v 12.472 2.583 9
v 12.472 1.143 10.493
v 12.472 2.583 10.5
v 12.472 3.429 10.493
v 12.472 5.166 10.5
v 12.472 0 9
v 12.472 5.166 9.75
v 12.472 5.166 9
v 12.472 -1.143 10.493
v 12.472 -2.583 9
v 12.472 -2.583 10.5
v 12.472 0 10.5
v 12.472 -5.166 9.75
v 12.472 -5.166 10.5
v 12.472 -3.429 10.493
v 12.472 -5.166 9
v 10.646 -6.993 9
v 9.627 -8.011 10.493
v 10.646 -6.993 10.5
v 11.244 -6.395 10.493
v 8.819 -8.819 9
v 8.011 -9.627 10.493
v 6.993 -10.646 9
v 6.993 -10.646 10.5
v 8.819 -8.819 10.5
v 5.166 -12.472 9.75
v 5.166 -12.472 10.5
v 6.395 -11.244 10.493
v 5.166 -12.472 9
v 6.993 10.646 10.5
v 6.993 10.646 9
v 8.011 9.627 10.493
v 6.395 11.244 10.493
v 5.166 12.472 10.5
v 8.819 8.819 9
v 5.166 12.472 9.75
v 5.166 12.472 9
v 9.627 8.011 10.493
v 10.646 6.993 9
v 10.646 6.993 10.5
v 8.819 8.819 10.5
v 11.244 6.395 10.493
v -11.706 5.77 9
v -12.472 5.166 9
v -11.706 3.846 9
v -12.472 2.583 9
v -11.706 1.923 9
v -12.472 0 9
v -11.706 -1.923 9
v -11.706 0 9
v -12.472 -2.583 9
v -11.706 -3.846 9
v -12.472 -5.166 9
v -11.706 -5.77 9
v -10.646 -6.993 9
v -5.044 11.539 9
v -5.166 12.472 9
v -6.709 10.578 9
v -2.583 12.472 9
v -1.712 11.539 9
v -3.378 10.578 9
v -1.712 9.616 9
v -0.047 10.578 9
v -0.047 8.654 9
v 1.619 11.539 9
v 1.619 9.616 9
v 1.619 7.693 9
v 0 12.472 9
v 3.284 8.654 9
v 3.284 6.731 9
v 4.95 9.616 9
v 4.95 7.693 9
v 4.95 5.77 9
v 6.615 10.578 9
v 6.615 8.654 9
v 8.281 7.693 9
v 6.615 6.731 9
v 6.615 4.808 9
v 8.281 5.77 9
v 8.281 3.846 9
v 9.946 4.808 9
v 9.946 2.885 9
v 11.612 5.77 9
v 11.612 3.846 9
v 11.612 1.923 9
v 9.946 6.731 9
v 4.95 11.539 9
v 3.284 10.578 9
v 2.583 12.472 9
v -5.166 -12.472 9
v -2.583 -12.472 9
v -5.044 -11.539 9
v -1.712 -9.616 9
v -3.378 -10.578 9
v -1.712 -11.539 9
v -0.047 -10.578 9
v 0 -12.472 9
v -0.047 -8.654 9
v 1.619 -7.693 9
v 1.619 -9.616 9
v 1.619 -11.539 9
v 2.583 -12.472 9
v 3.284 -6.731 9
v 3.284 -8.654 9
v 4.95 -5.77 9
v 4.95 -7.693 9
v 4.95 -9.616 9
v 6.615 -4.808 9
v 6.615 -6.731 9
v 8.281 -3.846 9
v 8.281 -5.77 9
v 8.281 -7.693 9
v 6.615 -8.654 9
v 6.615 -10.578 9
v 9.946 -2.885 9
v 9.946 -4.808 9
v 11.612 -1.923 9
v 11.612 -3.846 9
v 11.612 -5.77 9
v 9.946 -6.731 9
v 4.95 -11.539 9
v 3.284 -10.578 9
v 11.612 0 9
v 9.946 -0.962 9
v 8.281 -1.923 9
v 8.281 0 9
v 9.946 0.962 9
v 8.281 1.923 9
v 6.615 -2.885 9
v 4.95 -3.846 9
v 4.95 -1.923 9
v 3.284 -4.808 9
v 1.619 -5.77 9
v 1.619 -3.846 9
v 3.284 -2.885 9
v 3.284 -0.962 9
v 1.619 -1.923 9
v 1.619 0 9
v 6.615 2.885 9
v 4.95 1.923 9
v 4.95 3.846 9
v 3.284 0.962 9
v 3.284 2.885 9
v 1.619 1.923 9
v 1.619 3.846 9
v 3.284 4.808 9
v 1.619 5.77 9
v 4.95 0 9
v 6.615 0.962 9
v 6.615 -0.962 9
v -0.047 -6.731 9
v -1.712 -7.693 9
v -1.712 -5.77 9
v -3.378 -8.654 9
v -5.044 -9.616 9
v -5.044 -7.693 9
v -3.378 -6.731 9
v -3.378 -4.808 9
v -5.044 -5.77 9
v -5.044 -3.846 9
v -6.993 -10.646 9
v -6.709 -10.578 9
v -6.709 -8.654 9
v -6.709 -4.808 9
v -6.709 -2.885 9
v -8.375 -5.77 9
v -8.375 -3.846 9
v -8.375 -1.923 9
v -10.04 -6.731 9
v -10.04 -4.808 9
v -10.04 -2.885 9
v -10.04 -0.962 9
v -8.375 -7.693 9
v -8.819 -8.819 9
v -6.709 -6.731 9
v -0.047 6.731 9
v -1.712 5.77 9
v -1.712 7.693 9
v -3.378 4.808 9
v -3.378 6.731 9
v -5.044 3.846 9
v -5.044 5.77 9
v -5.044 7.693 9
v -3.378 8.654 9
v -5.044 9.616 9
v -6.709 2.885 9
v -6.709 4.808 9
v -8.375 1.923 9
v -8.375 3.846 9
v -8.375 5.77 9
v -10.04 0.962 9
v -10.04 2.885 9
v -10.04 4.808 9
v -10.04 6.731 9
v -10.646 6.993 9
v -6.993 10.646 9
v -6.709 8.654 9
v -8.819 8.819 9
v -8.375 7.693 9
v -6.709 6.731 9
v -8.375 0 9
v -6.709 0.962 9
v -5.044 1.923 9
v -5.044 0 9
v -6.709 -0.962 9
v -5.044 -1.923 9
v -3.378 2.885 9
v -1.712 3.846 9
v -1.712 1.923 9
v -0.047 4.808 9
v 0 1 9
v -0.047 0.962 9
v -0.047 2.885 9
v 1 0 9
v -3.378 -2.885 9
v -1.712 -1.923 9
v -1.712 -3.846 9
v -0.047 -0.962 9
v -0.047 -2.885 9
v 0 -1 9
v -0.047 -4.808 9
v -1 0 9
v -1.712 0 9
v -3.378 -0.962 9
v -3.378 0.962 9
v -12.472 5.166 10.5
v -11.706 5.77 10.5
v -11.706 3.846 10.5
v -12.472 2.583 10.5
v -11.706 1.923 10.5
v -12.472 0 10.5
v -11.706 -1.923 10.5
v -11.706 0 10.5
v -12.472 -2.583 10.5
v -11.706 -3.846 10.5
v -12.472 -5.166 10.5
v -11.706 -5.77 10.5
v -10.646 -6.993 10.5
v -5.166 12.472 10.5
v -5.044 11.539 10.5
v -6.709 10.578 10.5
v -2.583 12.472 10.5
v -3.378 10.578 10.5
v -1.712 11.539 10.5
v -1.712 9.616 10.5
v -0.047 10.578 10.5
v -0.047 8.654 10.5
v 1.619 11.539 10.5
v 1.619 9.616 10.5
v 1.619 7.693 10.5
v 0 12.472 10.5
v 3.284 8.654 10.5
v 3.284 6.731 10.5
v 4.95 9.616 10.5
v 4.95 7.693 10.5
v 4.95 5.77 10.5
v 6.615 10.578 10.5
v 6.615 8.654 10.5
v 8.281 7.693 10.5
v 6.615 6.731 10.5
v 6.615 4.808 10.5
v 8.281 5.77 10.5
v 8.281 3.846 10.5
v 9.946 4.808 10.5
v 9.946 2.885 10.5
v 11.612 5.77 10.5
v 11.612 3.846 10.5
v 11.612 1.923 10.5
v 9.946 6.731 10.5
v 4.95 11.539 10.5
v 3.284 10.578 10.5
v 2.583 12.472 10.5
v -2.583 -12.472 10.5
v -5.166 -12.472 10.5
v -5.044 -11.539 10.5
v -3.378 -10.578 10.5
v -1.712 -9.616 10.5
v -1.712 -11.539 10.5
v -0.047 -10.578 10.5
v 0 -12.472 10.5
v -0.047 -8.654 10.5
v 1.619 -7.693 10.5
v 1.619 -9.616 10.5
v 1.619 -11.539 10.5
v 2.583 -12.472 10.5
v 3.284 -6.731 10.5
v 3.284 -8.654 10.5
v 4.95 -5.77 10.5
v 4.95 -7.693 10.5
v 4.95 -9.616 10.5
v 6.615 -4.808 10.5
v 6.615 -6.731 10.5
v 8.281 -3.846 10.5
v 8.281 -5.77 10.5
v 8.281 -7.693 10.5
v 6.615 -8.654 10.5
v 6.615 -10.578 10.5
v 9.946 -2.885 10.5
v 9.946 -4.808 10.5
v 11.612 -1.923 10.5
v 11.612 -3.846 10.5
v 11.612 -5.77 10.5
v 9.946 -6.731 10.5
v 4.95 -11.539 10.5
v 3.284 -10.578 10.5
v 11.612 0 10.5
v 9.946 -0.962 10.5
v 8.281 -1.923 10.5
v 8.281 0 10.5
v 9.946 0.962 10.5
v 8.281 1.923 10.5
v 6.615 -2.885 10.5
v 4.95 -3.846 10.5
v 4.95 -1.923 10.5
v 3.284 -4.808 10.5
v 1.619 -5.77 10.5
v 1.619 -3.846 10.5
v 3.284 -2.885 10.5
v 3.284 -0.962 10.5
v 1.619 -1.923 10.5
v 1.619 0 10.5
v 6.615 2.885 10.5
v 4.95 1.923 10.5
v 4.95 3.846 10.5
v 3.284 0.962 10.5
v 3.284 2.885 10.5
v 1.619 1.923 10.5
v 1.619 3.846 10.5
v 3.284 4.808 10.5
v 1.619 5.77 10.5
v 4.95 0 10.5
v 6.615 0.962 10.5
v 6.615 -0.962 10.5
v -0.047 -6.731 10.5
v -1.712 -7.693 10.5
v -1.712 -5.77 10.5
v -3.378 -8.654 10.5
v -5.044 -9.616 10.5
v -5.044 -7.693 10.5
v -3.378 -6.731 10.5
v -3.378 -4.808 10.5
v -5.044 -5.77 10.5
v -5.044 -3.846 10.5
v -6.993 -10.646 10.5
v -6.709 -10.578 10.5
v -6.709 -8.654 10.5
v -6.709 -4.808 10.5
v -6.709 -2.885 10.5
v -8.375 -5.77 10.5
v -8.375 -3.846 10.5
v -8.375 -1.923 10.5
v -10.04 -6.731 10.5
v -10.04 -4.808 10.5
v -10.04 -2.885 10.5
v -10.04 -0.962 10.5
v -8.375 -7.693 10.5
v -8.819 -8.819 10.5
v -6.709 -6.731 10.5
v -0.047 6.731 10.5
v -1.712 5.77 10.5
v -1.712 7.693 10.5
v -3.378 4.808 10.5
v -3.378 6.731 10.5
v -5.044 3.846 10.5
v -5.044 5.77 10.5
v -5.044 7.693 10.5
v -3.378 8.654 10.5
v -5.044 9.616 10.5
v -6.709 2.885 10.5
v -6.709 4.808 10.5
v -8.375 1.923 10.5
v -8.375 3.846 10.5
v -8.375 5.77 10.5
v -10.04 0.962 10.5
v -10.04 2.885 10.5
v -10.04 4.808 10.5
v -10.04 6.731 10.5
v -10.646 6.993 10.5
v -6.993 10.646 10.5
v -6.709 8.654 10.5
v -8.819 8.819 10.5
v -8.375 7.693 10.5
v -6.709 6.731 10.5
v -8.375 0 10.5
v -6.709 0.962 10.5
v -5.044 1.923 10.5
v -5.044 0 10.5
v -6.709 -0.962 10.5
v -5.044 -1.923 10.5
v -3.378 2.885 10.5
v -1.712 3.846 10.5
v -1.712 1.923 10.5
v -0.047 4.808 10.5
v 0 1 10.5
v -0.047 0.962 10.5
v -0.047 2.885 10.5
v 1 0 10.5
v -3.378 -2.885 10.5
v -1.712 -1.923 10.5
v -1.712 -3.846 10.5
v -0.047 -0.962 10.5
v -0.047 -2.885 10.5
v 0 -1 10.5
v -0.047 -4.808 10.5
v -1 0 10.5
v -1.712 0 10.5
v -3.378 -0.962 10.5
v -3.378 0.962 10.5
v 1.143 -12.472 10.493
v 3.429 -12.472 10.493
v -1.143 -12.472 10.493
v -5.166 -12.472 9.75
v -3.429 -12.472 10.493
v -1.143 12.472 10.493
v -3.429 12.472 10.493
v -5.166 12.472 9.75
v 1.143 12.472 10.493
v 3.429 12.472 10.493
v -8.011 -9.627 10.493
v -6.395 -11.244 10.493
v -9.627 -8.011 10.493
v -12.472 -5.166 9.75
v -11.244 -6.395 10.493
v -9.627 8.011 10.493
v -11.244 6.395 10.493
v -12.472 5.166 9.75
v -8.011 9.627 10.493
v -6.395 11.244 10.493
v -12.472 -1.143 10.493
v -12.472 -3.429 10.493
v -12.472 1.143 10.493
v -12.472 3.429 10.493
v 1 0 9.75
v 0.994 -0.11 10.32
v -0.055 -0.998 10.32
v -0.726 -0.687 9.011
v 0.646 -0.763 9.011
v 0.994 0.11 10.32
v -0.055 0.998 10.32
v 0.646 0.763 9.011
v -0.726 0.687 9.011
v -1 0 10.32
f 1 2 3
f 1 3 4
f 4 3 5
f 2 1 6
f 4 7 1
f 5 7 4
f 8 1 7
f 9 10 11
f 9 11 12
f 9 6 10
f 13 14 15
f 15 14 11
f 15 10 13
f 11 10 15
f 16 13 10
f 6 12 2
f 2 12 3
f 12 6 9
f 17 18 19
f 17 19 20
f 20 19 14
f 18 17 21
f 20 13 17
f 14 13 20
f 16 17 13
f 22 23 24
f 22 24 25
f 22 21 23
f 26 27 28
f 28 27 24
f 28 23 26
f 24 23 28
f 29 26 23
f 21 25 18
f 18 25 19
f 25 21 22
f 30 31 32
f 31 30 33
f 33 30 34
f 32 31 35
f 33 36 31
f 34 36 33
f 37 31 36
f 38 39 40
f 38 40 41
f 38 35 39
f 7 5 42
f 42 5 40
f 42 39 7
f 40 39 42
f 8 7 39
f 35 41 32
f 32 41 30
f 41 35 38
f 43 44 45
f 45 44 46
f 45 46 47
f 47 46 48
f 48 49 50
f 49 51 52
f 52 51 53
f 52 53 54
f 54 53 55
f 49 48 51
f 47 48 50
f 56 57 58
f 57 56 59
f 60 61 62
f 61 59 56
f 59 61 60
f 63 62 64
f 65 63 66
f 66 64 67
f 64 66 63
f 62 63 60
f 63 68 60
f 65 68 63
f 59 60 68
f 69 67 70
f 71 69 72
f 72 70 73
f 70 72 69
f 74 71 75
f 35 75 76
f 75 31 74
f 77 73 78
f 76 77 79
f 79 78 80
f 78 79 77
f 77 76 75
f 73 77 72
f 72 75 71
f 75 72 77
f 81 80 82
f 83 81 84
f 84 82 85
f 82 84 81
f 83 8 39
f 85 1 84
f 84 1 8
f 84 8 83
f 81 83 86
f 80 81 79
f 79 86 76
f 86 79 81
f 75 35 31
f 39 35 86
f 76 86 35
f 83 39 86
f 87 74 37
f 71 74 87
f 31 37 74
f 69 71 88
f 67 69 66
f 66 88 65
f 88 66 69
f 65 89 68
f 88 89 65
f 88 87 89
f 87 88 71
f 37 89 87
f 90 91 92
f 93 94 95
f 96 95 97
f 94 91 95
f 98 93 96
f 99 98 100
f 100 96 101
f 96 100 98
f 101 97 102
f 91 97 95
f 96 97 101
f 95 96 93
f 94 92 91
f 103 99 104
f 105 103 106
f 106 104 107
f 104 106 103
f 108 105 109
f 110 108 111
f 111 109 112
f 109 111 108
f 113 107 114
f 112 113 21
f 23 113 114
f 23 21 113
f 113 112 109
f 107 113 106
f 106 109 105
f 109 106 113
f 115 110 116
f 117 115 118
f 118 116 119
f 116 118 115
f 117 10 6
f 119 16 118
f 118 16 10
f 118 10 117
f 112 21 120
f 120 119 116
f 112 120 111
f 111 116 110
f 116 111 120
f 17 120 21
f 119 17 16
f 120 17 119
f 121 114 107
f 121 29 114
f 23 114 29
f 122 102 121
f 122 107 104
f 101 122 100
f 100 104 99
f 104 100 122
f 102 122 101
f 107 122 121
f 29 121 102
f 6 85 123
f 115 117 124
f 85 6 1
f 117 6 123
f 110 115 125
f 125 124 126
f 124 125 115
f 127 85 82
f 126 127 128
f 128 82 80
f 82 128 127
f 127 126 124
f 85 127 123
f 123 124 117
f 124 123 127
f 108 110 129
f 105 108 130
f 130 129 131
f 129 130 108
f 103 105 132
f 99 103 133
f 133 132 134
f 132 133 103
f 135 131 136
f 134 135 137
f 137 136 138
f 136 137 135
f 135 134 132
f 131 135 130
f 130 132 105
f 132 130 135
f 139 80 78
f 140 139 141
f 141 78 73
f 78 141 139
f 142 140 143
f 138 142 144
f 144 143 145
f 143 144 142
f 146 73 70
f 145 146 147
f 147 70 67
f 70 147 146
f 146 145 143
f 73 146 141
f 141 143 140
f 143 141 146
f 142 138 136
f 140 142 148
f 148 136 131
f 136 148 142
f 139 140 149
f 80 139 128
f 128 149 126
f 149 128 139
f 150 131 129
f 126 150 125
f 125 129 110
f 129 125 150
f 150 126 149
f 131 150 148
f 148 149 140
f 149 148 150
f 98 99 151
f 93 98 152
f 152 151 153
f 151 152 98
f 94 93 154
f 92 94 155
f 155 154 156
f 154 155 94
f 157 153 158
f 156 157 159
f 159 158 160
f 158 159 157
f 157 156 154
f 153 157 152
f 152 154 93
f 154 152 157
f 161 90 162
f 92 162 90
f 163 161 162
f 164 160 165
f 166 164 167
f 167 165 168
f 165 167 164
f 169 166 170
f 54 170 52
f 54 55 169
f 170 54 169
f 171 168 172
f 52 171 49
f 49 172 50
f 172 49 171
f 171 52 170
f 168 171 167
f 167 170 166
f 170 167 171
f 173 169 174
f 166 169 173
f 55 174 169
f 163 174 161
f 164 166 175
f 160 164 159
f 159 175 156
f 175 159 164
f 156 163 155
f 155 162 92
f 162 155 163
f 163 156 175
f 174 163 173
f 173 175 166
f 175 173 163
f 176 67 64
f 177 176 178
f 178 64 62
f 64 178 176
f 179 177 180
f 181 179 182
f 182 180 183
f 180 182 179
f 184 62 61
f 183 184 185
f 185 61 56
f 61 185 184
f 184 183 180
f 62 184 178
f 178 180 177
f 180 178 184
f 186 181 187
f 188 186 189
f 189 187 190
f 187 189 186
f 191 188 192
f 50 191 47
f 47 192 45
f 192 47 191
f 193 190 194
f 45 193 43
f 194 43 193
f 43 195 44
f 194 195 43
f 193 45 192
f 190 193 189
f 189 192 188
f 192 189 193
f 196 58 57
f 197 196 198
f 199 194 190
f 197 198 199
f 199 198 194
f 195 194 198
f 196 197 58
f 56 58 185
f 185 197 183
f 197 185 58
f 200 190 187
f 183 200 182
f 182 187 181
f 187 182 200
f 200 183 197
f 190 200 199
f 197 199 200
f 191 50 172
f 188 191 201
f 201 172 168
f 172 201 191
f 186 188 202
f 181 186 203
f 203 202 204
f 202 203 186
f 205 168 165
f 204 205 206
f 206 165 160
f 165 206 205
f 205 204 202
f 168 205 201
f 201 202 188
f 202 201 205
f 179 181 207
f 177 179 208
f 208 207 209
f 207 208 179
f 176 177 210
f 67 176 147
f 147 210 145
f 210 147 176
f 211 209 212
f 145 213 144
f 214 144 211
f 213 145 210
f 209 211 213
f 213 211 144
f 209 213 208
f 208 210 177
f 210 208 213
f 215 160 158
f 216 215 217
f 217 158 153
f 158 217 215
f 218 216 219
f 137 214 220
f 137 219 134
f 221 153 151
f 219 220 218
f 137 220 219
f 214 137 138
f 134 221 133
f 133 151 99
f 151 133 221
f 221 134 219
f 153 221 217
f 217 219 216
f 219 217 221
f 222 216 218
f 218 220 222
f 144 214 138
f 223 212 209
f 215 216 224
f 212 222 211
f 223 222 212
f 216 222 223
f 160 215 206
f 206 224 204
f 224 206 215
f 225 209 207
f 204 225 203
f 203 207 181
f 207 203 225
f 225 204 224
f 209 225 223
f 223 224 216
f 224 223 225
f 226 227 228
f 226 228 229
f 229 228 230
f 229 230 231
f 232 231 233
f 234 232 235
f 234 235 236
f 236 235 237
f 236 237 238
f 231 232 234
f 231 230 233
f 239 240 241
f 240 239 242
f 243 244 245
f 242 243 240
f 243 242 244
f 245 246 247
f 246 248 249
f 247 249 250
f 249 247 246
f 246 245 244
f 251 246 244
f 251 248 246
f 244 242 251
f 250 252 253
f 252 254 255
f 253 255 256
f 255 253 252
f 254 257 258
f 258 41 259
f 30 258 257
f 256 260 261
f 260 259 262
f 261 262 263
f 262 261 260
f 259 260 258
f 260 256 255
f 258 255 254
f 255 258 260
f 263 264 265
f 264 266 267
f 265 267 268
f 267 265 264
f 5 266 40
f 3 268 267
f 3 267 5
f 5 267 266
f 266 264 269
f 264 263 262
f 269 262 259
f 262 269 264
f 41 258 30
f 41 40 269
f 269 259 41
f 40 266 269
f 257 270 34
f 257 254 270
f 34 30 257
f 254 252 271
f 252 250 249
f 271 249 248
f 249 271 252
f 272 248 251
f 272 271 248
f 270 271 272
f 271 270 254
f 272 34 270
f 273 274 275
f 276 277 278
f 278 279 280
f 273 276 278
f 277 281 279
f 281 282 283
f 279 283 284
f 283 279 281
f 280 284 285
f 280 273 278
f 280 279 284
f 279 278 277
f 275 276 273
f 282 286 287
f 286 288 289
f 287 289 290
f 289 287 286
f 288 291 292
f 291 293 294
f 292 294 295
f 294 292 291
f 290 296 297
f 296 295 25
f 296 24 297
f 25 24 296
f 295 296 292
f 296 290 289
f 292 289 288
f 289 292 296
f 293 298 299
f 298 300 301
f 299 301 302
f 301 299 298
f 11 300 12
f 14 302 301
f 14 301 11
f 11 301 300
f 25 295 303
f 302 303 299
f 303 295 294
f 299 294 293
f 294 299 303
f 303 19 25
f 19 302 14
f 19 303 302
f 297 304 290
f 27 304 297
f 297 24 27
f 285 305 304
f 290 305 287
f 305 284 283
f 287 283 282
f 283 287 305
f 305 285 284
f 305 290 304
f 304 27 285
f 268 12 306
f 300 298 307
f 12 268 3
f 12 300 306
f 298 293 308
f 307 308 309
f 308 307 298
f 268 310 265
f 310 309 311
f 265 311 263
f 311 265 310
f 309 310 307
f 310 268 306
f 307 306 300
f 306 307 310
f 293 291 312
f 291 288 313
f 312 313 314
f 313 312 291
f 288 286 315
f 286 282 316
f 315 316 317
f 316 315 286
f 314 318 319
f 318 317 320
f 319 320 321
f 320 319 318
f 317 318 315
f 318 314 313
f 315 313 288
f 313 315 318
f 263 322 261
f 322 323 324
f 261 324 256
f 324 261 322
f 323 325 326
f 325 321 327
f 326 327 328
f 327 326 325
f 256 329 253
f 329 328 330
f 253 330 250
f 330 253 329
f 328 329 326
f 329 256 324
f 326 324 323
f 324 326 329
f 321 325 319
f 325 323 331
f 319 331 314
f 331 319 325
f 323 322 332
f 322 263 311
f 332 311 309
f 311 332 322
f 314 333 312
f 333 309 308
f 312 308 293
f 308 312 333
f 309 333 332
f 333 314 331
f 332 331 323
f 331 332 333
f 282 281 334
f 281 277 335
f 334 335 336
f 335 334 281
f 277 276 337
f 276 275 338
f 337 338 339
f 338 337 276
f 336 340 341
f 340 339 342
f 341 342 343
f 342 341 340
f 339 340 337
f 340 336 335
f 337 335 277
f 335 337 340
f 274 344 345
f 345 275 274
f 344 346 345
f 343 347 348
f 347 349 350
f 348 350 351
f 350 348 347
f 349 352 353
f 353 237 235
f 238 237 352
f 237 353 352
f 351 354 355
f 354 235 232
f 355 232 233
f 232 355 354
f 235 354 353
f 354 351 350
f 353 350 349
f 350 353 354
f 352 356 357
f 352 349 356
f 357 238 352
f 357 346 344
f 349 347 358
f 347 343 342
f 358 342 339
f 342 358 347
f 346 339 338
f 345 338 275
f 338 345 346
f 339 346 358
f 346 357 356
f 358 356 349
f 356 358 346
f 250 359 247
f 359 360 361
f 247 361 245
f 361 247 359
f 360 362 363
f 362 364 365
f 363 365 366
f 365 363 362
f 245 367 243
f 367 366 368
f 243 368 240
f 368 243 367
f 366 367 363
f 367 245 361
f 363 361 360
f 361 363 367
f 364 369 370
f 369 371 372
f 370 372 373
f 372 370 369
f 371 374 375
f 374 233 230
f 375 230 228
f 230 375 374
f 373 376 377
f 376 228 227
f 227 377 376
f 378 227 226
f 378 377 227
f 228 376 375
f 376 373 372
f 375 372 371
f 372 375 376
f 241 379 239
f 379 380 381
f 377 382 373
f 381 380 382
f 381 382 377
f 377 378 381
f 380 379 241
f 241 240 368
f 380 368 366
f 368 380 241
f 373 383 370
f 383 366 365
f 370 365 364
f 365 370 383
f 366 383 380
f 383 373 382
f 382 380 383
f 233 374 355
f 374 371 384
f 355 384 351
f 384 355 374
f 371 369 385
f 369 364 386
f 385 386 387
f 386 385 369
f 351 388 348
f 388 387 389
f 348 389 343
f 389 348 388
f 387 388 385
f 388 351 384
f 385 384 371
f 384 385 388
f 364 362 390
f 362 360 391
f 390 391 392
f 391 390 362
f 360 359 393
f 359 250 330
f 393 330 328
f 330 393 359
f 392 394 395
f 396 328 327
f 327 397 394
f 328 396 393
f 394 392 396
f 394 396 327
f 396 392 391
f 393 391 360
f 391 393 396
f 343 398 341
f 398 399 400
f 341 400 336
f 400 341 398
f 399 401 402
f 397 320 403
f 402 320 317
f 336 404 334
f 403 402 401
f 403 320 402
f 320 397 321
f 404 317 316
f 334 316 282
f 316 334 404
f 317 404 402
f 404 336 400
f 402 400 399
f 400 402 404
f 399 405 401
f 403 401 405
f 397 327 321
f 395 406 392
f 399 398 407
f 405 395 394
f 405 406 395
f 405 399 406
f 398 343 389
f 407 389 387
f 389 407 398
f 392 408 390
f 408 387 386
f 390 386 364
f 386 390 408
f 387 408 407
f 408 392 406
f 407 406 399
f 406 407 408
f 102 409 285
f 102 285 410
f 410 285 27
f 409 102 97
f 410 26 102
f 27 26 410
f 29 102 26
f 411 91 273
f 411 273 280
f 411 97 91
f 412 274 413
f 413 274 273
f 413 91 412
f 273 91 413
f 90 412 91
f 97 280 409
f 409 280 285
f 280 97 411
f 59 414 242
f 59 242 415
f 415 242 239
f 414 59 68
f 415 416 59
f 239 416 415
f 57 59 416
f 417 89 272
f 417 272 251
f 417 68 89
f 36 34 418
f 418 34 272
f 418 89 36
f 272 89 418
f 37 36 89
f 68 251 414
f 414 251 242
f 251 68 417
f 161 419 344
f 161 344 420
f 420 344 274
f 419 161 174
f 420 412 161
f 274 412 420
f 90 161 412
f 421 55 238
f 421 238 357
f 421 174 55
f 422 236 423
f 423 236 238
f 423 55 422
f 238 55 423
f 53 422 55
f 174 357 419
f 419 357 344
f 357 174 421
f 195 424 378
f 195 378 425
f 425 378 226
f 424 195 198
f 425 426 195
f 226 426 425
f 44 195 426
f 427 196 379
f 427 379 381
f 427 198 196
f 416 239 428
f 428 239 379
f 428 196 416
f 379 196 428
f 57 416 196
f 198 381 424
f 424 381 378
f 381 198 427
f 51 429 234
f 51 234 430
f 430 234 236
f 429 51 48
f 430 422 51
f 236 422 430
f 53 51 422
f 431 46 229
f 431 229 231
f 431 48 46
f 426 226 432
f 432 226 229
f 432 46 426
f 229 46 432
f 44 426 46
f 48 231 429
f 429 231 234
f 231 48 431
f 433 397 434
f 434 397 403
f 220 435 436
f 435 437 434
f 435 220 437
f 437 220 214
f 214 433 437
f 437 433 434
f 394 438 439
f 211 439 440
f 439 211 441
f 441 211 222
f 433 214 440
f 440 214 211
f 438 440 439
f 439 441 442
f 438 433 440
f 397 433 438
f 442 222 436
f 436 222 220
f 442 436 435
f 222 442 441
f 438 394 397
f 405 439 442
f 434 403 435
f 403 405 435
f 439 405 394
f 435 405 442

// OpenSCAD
// CSG file generated from FreeCAD 0.21.1
group() {
 group(){
polyhedron ( points = [[12.472374,-5.166226,9.000000],[12.472374,-5.166226,10.500000],[12.472374,5.166226,9.000000],[12.472374,5.166226,10.500000],[5.166226,-12.472374,9.000000],[5.166226,-12.472374,10.500000],[5.166226,12.472374,9.000000],[5.166226,12.472374,10.500000],[-5.166226,-12.472374,9.000000],[-5.166226,12.472374,9.000000],[-12.472374,-5.166226,9.000000],[-12.472374,5.166226,9.000000],[1.000000,0.000000,9.000000],[-5.166226,-12.472374,10.500000],[-5.166226,12.472374,10.500000],[-12.472374,-5.166226,10.500000],[-12.472374,5.166226,10.500000],[1.000000,0.000000,10.500000],[12.472374,-5.166226,9.750000],[12.472374,5.166226,9.750000],[12.472374,-2.583113,9.000000],[12.472374,-0.000000,9.000000],[12.472374,2.583113,9.000000],[12.472374,-2.583113,10.500000],[12.472374,-0.000000,10.500000],[12.472374,2.583113,10.500000],[5.166226,-12.472374,9.750000],[6.992763,-10.645837,9.000000],[8.819300,-8.819300,9.000000],[10.645837,-6.992763,9.000000],[6.992763,-10.645837,10.500000],[8.819300,-8.819300,10.500000],[10.645837,-6.992763,10.500000],[5.166226,12.472374,9.750000],[10.645837,6.992763,9.000000],[8.819300,8.819300,9.000000],[6.992763,10.645837,9.000000],[10.645837,6.992763,10.500000],[8.819300,8.819300,10.500000],[6.992763,10.645837,10.500000],[-2.583113,-12.472374,9.000000],[0.000000,-12.472374,9.000000],[2.583113,-12.472374,9.000000],[2.583113,12.472374,9.000000],[0.000000,12.472374,9.000000],[-2.583113,12.472374,9.000000],[-10.645837,-6.992763,9.000000],[-8.819300,-8.819300,9.000000],[-6.992763,-10.645837,9.000000],[-6.992763,10.645837,9.000000],[-8.819300,8.819300,9.000000],[-10.645837,6.992763,9.000000],[-12.472374,2.583113,9.000000],[-12.472374,-0.000000,9.000000],[-12.472374,-2.583113,9.000000],[0.000000,1.000000,9.000000],[-1.000000,0.000000,9.000000],[-0.000000,-1.000000,9.000000],[-2.583113,-12.472374,10.500000],[0.000000,-12.472374,10.500000],[2.583113,-12.472374,10.500000],[2.583113,12.472374,10.500000],[0.000000,12.472374,10.500000],[-2.583113,12.472374,10.500000],[-10.645837,-6.992763,10.500000],[-8.819300,-8.819300,10.500000],[-6.992763,-10.645837,10.500000],[-6.992763,10.645837,10.500000],[-8.819300,8.819300,10.500000],[-10.645837,6.992763,10.500000],[-12.472374,2.583113,10.500000],[-12.472374,-0.000000,10.500000],[-12.472374,-2.583113,10.500000],[0.000000,1.000000,10.500000],[-1.000000,0.000000,10.500000],[-0.000000,-1.000000,10.500000],[-5.166226,-12.472374,9.750000],[-5.166226,12.472374,9.750000],[-12.472374,-5.166226,9.750000],[-12.472374,5.166226,9.750000],[1.000000,0.000000,9.750000],[12.472374,3.428589,10.492579],[12.472374,1.142863,10.492579],[12.472374,-1.142863,10.492579],[12.472374,-3.428590,10.492579],[11.243679,-6.394921,10.492579],[9.627426,-8.011174,10.492579],[8.011174,-9.627426,10.492579],[6.394921,-11.243679,10.492579],[6.394921,11.243679,10.492579],[8.011174,9.627426,10.492579],[9.627426,8.011174,10.492579],[11.243679,6.394921,10.492579],[1.618650,7.692821,9.000000],[8.280828,3.846411,9.000000],[-11.705707,-0.000000,9.000000],[1.618650,-7.692821,9.000000],[8.280828,-3.846411,9.000000],[-5.043528,11.539231,9.000000],[-5.043528,-11.539231,9.000000],[1.618650,-0.000000,9.000000],[-5.043528,-3.846411,9.000000],[-5.043528,3.846411,9.000000],[-11.705707,3.846411,9.000000],[-11.705707,-3.846411,9.000000],[-1.712439,9.616026,9.000000],[1.618650,11.539231,9.000000],[4.949739,9.616026,9.000000],[4.949739,5.769616,9.000000],[8.280828,7.692821,9.000000],[11.611918,5.769616,9.000000],[11.611918,1.923205,9.000000],[-1.712439,-9.616026,9.000000],[1.618650,-11.539231,9.000000],[4.949739,-5.769616,9.000000],[4.949739,-9.616026,9.000000],[8.280828,-7.692821,9.000000],[11.611918,-1.923205,9.000000],[11.611918,-5.769616,9.000000],[8.280828,-0.000000,9.000000],[4.949739,-1.923205,9.000000],[1.618650,-3.846411,9.000000],[4.949739,1.923205,9.000000],[1.618650,3.846411,9.000000],[-1.712439,-5.769616,9.000000],[-5.043528,-7.692821,9.000000],[-8.374618,-5.769616,9.000000],[-8.374618,-1.923205,9.000000],[-1.712439,5.769616,9.000000],[-5.043528,7.692821,9.000000],[-8.374618,1.923205,9.000000],[-8.374618,5.769616,9.000000],[-5.043528,-0.000000,9.000000],[-1.712439,1.923205,9.000000],[-1.712439,-1.923205,9.000000],[-11.705707,5.769616,9.000000],[-11.705707,1.923205,9.000000],[-11.705707,-1.923205,9.000000],[-11.705707,-5.769616,9.000000],[-3.377984,10.577629,9.000000],[-1.712439,11.539231,9.000000],[-0.046894,10.577629,9.000000],[-0.046894,8.654424,9.000000],[1.618650,9.616026,9.000000],[3.284195,8.654424,9.000000],[3.284195,6.731218,9.000000],[4.949739,7.692821,9.000000],[6.615284,10.577629,9.000000],[6.615284,8.654424,9.000000],[6.615284,6.731218,9.000000],[6.615284,4.808013,9.000000],[8.280828,5.769616,9.000000],[9.946373,4.808013,9.000000],[9.946373,2.884808,9.000000],[11.611918,3.846411,9.000000],[9.946373,6.731218,9.000000],[4.949739,11.539231,9.000000],[3.284195,10.577629,9.000000],[-3.377984,-10.577629,9.000000],[-1.712439,-11.539231,9.000000],[-0.046894,-8.654424,9.000000],[-0.046894,-10.577629,9.000000],[1.618650,-9.616026,9.000000],[3.284195,-6.731218,9.000000],[3.284195,-8.654424,9.000000],[4.949739,-7.692821,9.000000],[6.615284,-4.808013,9.000000],[6.615284,-6.731218,9.000000],[8.280828,-5.769616,9.000000],[6.615284,-8.654424,9.000000],[6.615284,-10.577629,9.000000],[9.946373,-2.884808,9.000000],[9.946373,-4.808013,9.000000],[11.611918,-3.846411,9.000000],[9.946373,-6.731218,9.000000],[4.949739,-11.539231,9.000000],[3.284195,-10.577629,9.000000],[11.611918,-0.000000,9.000000],[9.946373,-0.961603,9.000000],[8.280828,-1.923205,9.000000],[9.946373,0.961603,9.000000],[8.280828,1.923205,9.000000],[6.615284,-2.884808,9.000000],[4.949739,-3.846411,9.000000],[3.284195,-4.808013,9.000000],[1.618650,-5.769616,9.000000],[3.284195,-2.884808,9.000000],[3.284195,-0.961603,9.000000],[1.618650,-1.923205,9.000000],[6.615284,2.884808,9.000000],[4.949739,3.846411,9.000000],[3.284195,0.961603,9.000000],[3.284195,2.884808,9.000000],[1.618650,1.923205,9.000000],[3.284195,4.808013,9.000000],[1.618650,5.769616,9.000000],[4.949739,-0.000000,9.000000],[6.615284,0.961603,9.000000],[6.615284,-0.961603,9.000000],[-0.046894,-6.731218,9.000000],[-1.712439,-7.692821,9.000000],[-3.377984,-8.654424,9.000000],[-5.043528,-9.616026,9.000000],[-3.377984,-6.731218,9.000000],[-3.377984,-4.808013,9.000000],[-5.043528,-5.769616,9.000000],[-6.709073,-10.577629,9.000000],[-6.709073,-4.808013,9.000000],[-6.709073,-2.884808,9.000000],[-8.374618,-3.846411,9.000000],[-10.040162,-6.731218,9.000000],[-10.040162,-4.808013,9.000000],[-10.040162,-2.884808,9.000000],[-10.040162,-0.961603,9.000000],[-8.374618,-7.692821,9.000000],[-6.709073,-6.731218,9.000000],[-6.709073,-8.654424,9.000000],[-0.046894,6.731218,9.000000],[-1.712439,7.692821,9.000000],[-3.377984,4.808013,9.000000],[-3.377984,6.731218,9.000000],[-5.043528,5.769616,9.000000],[-3.377984,8.654424,9.000000],[-5.043528,9.616026,9.000000],[-6.709073,2.884808,9.000000],[-6.709073,4.808013,9.000000],[-8.374618,3.846411,9.000000],[-10.040162,0.961603,9.000000],[-10.040162,2.884808,9.000000],[-10.040162,4.808013,9.000000],[-10.040162,6.731218,9.000000],[-6.709073,10.577629,9.000000],[-8.374618,7.692821,9.000000],[-6.709073,8.654424,9.000000],[-6.709073,6.731218,9.000000],[-8.374618,-0.000000,9.000000],[-6.709073,0.961603,9.000000],[-5.043528,1.923205,9.000000],[-6.709073,-0.961603,9.000000],[-5.043528,-1.923205,9.000000],[-3.377984,2.884808,9.000000],[-1.712439,3.846411,9.000000],[-0.046894,4.808013,9.000000],[-0.046894,2.884808,9.000000],[-0.046894,0.961603,9.000000],[-3.377984,-2.884808,9.000000],[-1.712439,-3.846411,9.000000],[-0.046894,-0.961603,9.000000],[-0.046894,-2.884808,9.000000],[-0.046894,-4.808013,9.000000],[-1.712439,-0.000000,9.000000],[-3.377984,-0.961603,9.000000],[-3.377984,0.961603,9.000000],[1.618650,7.692821,10.500000],[8.280828,3.846411,10.500000],[-11.705707,-0.000000,10.500000],[1.618650,-7.692821,10.500000],[8.280828,-3.846411,10.500000],[-5.043528,11.539231,10.500000],[-5.043528,-11.539231,10.500000],[1.618650,-0.000000,10.500000],[-5.043528,-3.846411,10.500000],[-5.043528,3.846411,10.500000],[-11.705707,3.846411,10.500000],[-11.705707,-3.846411,10.500000],[-1.712439,9.616026,10.500000],[1.618650,11.539231,10.500000],[4.949739,9.616026,10.500000],[4.949739,5.769616,10.500000],[8.280828,7.692821,10.500000],[11.611918,5.769616,10.500000],[11.611918,1.923205,10.500000],[-1.712439,-9.616026,10.500000],[1.618650,-11.539231,10.500000],[4.949739,-5.769616,10.500000],[4.949739,-9.616026,10.500000],[8.280828,-7.692821,10.500000],[11.611918,-1.923205,10.500000],[11.611918,-5.769616,10.500000],[8.280828,-0.000000,10.500000],[4.949739,-1.923205,10.500000],[1.618650,-3.846411,10.500000],[4.949739,1.923205,10.500000],[1.618650,3.846411,10.500000],[-1.712439,-5.769616,10.500000],[-5.043528,-7.692821,10.500000],[-8.374618,-5.769616,10.500000],[-8.374618,-1.923205,10.500000],[-1.712439,5.769616,10.500000],[-5.043528,7.692821,10.500000],[-8.374618,1.923205,10.500000],[-8.374618,5.769616,10.500000],[-5.043528,-0.000000,10.500000],[-1.712439,1.923205,10.500000],[-1.712439,-1.923205,10.500000],[-11.705707,5.769616,10.500000],[-11.705707,1.923205,10.500000],[-11.705707,-1.923205,10.500000],[-11.705707,-5.769616,10.500000],[-3.377984,10.577629,10.500000],[-1.712439,11.539231,10.500000],[-0.046894,10.577629,10.500000],[-0.046894,8.654424,10.500000],[1.618650,9.616026,10.500000],[3.284195,8.654424,10.500000],[3.284195,6.731218,10.500000],[4.949739,7.692821,10.500000],[6.615284,10.577629,10.500000],[6.615284,8.654424,10.500000],[6.615284,6.731218,10.500000],[6.615284,4.808013,10.500000],[8.280828,5.769616,10.500000],[9.946373,4.808013,10.500000],[9.946373,2.884808,10.500000],[11.611918,3.846411,10.500000],[9.946373,6.731218,10.500000],[4.949739,11.539231,10.500000],[3.284195,10.577629,10.500000],[-3.377984,-10.577629,10.500000],[-1.712439,-11.539231,10.500000],[-0.046894,-8.654424,10.500000],[-0.046894,-10.577629,10.500000],[1.618650,-9.616026,10.500000],[3.284195,-6.731218,10.500000],[3.284195,-8.654424,10.500000],[4.949739,-7.692821,10.500000],[6.615284,-4.808013,10.500000],[6.615284,-6.731218,10.500000],[8.280828,-5.769616,10.500000],[6.615284,-8.654424,10.500000],[6.615284,-10.577629,10.500000],[9.946373,-2.884808,10.500000],[9.946373,-4.808013,10.500000],[11.611918,-3.846411,10.500000],[9.946373,-6.731218,10.500000],[4.949739,-11.539231,10.500000],[3.284195,-10.577629,10.500000],[11.611918,-0.000000,10.500000],[9.946373,-0.961603,10.500000],[8.280828,-1.923205,10.500000],[9.946373,0.961603,10.500000],[8.280828,1.923205,10.500000],[6.615284,-2.884808,10.500000],[4.949739,-3.846411,10.500000],[3.284195,-4.808013,10.500000],[1.618650,-5.769616,10.500000],[3.284195,-2.884808,10.500000],[3.284195,-0.961603,10.500000],[1.618650,-1.923205,10.500000],[6.615284,2.884808,10.500000],[4.949739,3.846411,10.500000],[3.284195,0.961603,10.500000],[3.284195,2.884808,10.500000],[1.618650,1.923205,10.500000],[3.284195,4.808013,10.500000],[1.618650,5.769616,10.500000],[4.949739,-0.000000,10.500000],[6.615284,0.961603,10.500000],[6.615284,-0.961603,10.500000],[-0.046894,-6.731218,10.500000],[-1.712439,-7.692821,10.500000],[-3.377984,-8.654424,10.500000],[-5.043528,-9.616026,10.500000],[-3.377984,-6.731218,10.500000],[-3.377984,-4.808013,10.500000],[-5.043528,-5.769616,10.500000],[-6.709073,-10.577629,10.500000],[-6.709073,-4.808013,10.500000],[-6.709073,-2.884808,10.500000],[-8.374618,-3.846411,10.500000],[-10.040162,-6.731218,10.500000],[-10.040162,-4.808013,10.500000],[-10.040162,-2.884808,10.500000],[-10.040162,-0.961603,10.500000],[-8.374618,-7.692821,10.500000],[-6.709073,-6.731218,10.500000],[-6.709073,-8.654424,10.500000],[-0.046894,6.731218,10.500000],[-1.712439,7.692821,10.500000],[-3.377984,4.808013,10.500000],[-3.377984,6.731218,10.500000],[-5.043528,5.769616,10.500000],[-3.377984,8.654424,10.500000],[-5.043528,9.616026,10.500000],[-6.709073,2.884808,10.500000],[-6.709073,4.808013,10.500000],[-8.374618,3.846411,10.500000],[-10.040162,0.961603,10.500000],[-10.040162,2.884808,10.500000],[-10.040162,4.808013,10.500000],[-10.040162,6.731218,10.500000],[-6.709073,10.577629,10.500000],[-8.374618,7.692821,10.500000],[-6.709073,8.654424,10.500000],[-6.709073,6.731218,10.500000],[-8.374618,-0.000000,10.500000],[-6.709073,0.961603,10.500000],[-5.043528,1.923205,10.500000],[-6.709073,-0.961603,10.500000],[-5.043528,-1.923205,10.500000],[-3.377984,2.884808,10.500000],[-1.712439,3.846411,10.500000],[-0.046894,4.808013,10.500000],[-0.046894,2.884808,10.500000],[-0.046894,0.961603,10.500000],[-3.377984,-2.884808,10.500000],[-1.712439,-3.846411,10.500000],[-0.046894,-0.961603,10.500000],[-0.046894,-2.884808,10.500000],[-0.046894,-4.808013,10.500000],[-1.712439,-0.000000,10.500000],[-3.377984,-0.961603,10.500000],[-3.377984,0.961603,10.500000],[3.428590,-12.472374,10.492579],[1.142863,-12.472374,10.492579],[-1.142863,-12.472374,10.492579],[-3.428589,-12.472374,10.492579],[-3.428589,12.472374,10.492579],[-1.142863,12.472374,10.492579],[1.142863,12.472374,10.492579],[3.428589,12.472374,10.492579],[-6.394921,-11.243679,10.492579],[-8.011174,-9.627426,10.492579],[-9.627426,-8.011174,10.492579],[-11.243679,-6.394921,10.492579],[-11.243679,6.394921,10.492579],[-9.627426,8.011174,10.492579],[-8.011174,9.627426,10.492579],[-6.394921,11.243679,10.492579],[-12.472374,-3.428590,10.492579],[-12.472374,-1.142863,10.492579],[-12.472374,1.142863,10.492579],[-12.472374,3.428589,10.492579],[-0.055061,0.998483,10.319928],[-0.055061,-0.998483,10.319928],[0.993936,-0.109956,10.319928],[0.646329,-0.763058,9.011366],[-0.726313,-0.687364,9.011366],[0.993936,0.109956,10.319928],[-0.726313,0.687364,9.011366],[0.646329,0.763058,9.011366],[-1.000000,-0.000000,10.319928]], faces = [[25,82,22],[81,25,22],[3,25,81],[21,22,82],[22,19,81],[81,19,3],[19,22,2],[23,20,83],[24,23,83],[20,21,83],[84,1,18],[23,1,84],[18,20,84],[84,20,23],[20,18,0],[82,24,21],[25,24,82],[83,21,24],[32,86,29],[85,32,29],[1,32,85],[28,29,86],[29,18,85],[85,18,1],[18,29,0],[30,27,87],[31,30,87],[27,28,87],[88,5,26],[30,5,88],[26,27,88],[88,27,30],[27,26,4],[86,31,28],[32,31,86],[87,28,31],[90,36,39],[89,39,36],[7,39,89],[35,36,90],[36,33,89],[89,33,7],[33,36,6],[37,34,91],[38,37,91],[34,35,91],[92,3,19],[37,3,92],[19,34,92],[92,34,37],[34,19,2],[90,38,35],[39,38,90],[91,35,38],[103,11,135],[52,11,103],[136,52,103],[53,52,136],[95,137,53],[104,54,137],[10,54,104],[138,10,104],[46,10,138],[54,53,137],[95,53,136],[231,9,98],[45,98,9],[105,139,140],[98,45,139],[140,139,45],[142,105,141],[143,141,106],[93,142,143],[141,143,142],[140,141,105],[140,44,141],[141,44,106],[44,140,45],[145,93,144],[146,144,107],[108,145,146],[144,146,145],[148,107,147],[109,148,35],[147,36,148],[150,108,149],[151,149,109],[94,150,151],[149,151,150],[148,109,149],[146,149,108],[107,148,146],[149,146,148],[153,94,152],[154,152,110],[111,153,154],[152,154,153],[34,2,110],[154,22,111],[2,22,154],[110,2,154],[155,110,152],[151,152,94],[109,155,151],[152,151,155],[36,35,148],[155,35,34],[35,155,109],[155,34,110],[6,147,156],[156,147,107],[147,6,36],[157,107,144],[143,144,93],[106,157,143],[144,143,157],[44,43,106],[106,43,157],[43,156,157],[107,157,156],[156,43,6],[99,40,8],[159,158,112],[41,159,161],[159,40,158],[161,112,160],[162,160,96],[113,161,162],[160,162,161],[42,41,113],[159,41,40],[113,41,161],[112,161,159],[40,99,158],[164,96,163],[165,163,114],[115,164,165],[163,165,164],[167,114,166],[168,166,97],[116,167,168],[166,168,167],[170,115,169],[28,169,116],[170,169,27],[169,28,27],[167,116,169],[165,169,115],[114,167,165],[169,165,167],[172,97,171],[173,171,117],[118,172,173],[171,173,172],[21,20,117],[173,0,118],[20,0,173],[117,20,173],[174,28,116],[172,118,174],[168,174,116],[97,172,168],[174,168,172],[28,174,29],[0,29,118],[118,29,174],[115,170,175],[170,4,175],[4,170,27],[175,42,176],[164,115,176],[162,176,113],[96,164,162],[176,162,164],[113,176,42],[175,176,115],[42,175,4],[177,111,21],[178,117,171],[22,21,111],[177,21,117],[179,171,97],[119,178,179],[171,179,178],[153,111,180],[181,180,119],[94,153,181],[180,181,153],[178,119,180],[177,180,111],[117,178,177],[180,177,178],[182,97,166],[183,166,114],[120,182,183],[166,183,182],[184,114,163],[185,163,96],[121,184,185],[163,185,184],[187,120,186],[188,186,121],[100,187,188],[186,188,187],[184,121,186],[183,186,120],[114,184,183],[186,183,184],[150,94,189],[190,189,122],[108,150,190],[189,190,150],[192,122,191],[193,191,100],[123,192,193],[191,193,192],[145,108,194],[195,194,123],[93,145,195],[194,195,145],[192,123,194],[190,194,108],[122,192,190],[194,190,192],[187,100,191],[196,191,122],[120,187,196],[191,196,187],[197,122,189],[181,189,94],[119,197,181],[189,181,197],[182,120,198],[179,198,119],[97,182,179],[198,179,182],[197,119,198],[196,198,120],[122,197,196],[198,196,197],[199,96,160],[200,160,112],[124,199,200],[160,200,199],[201,112,158],[202,158,99],[125,201,202],[158,202,201],[204,124,203],[205,203,125],[101,204,205],[203,205,204],[201,125,203],[200,203,124],[112,201,200],[203,200,201],[206,8,48],[8,206,99],[206,48,216],[208,101,207],[209,207,126],[127,208,209],[207,209,208],[211,126,210],[104,211,138],[210,46,138],[210,138,211],[213,127,212],[137,212,104],[95,213,137],[212,137,213],[211,104,212],[209,212,127],[126,211,209],[212,209,211],[47,210,214],[214,210,126],[210,47,46],[48,47,216],[215,126,207],[205,207,101],[125,215,205],[207,205,215],[202,216,125],[99,206,202],[216,202,206],[215,125,216],[214,216,47],[126,215,214],[216,214,215],[142,93,217],[218,217,128],[105,142,218],[217,218,142],[220,128,219],[221,219,102],[129,220,221],[219,221,220],[139,105,222],[223,222,129],[98,139,223],[222,223,139],[220,129,222],[218,222,105],[128,220,218],[222,218,220],[225,102,224],[226,224,130],[131,225,226],[224,226,225],[228,130,227],[136,227,95],[103,228,136],[227,136,228],[230,131,229],[135,229,103],[229,135,230],[11,51,135],[135,51,230],[228,103,229],[226,229,131],[130,228,226],[229,226,228],[9,231,49],[50,49,233],[131,230,232],[232,50,233],[230,50,232],[50,230,51],[231,233,49],[223,231,98],[129,233,223],[231,223,233],[225,131,234],[221,234,129],[102,225,221],[234,221,225],[233,129,234],[232,234,131],[234,232,233],[213,95,227],[235,227,130],[127,213,235],[227,235,213],[236,130,224],[237,224,102],[132,236,237],[224,237,236],[208,127,238],[239,238,132],[101,208,239],[238,239,208],[236,132,238],[235,238,127],[130,236,235],[238,235,236],[240,102,219],[241,219,128],[133,240,241],[219,241,240],[242,128,217],[195,217,93],[123,242,195],[217,195,242],[244,133,55],[193,243,123],[55,193,12],[242,123,243],[243,55,133],[193,55,243],[241,243,133],[128,242,241],[243,241,242],[204,101,245],[246,245,134],[124,204,246],[245,246,204],[248,134,247],[57,12,188],[121,248,188],[199,124,249],[247,57,248],[248,57,188],[100,188,12],[185,249,121],[96,199,185],[249,185,199],[248,121,249],[246,249,124],[134,248,246],[249,246,248],[247,134,56],[56,57,247],[100,12,193],[133,244,250],[251,134,245],[55,56,244],[244,56,250],[250,56,134],[239,245,101],[132,251,239],[245,239,251],[240,133,252],[237,252,132],[102,240,237],[252,237,240],[251,132,252],[250,252,133],[134,251,250],[252,250,251],[263,295,16],[70,263,16],[296,263,70],[71,296,70],[255,71,297],[264,297,72],[15,264,72],[298,264,15],[64,298,15],[72,297,71],[255,296,71],[391,258,14],[63,14,258],[265,300,299],[258,299,63],[300,63,299],[302,301,265],[303,266,301],[253,303,302],[301,302,303],[300,265,301],[300,301,62],[301,266,62],[62,63,300],[305,304,253],[306,267,304],[268,306,305],[304,305,306],[308,307,267],[269,38,308],[307,308,39],[310,309,268],[311,269,309],[254,311,310],[309,310,311],[308,309,269],[306,268,309],[267,306,308],[309,308,306],[313,312,254],[314,270,312],[271,314,313],[312,313,314],[37,270,3],[314,271,25],[3,314,25],[270,314,3],[315,312,270],[311,254,312],[269,311,315],[312,315,311],[39,308,38],[315,37,38],[38,269,315],[315,270,37],[7,316,307],[316,267,307],[307,39,7],[317,304,267],[303,253,304],[266,303,317],[304,317,303],[62,266,61],[266,317,61],[61,317,316],[267,316,317],[316,7,61],[259,13,58],[319,272,318],[59,321,319],[319,318,58],[321,320,272],[322,256,320],[273,322,321],[320,321,322],[60,273,59],[319,58,59],[273,321,59],[272,319,321],[58,318,259],[324,323,256],[325,274,323],[275,325,324],[323,324,325],[327,326,274],[328,257,326],[276,328,327],[326,327,328],[330,329,275],[31,276,329],[330,30,329],[329,30,31],[327,329,276],[325,275,329],[274,325,327],[329,327,325],[332,331,257],[333,277,331],[278,333,332],[331,332,333],[24,277,23],[333,278,1],[23,333,1],[277,333,23],[334,276,31],[332,334,278],[328,276,334],[257,328,332],[334,332,328],[31,32,334],[1,278,32],[278,334,32],[275,335,330],[330,335,5],[5,30,330],[335,336,60],[324,336,275],[322,273,336],[256,322,324],[336,324,322],[273,60,336],[335,275,336],[60,5,335],[337,24,271],[338,331,277],[25,271,24],[337,277,24],[339,257,331],[279,339,338],[331,338,339],[313,340,271],[341,279,340],[254,341,313],[340,313,341],[338,340,279],[337,271,340],[277,337,338],[340,338,337],[342,326,257],[343,274,326],[280,343,342],[326,342,343],[344,323,274],[345,256,323],[281,345,344],[323,344,345],[347,346,280],[348,281,346],[260,348,347],[346,347,348],[344,346,281],[343,280,346],[274,343,344],[346,344,343],[310,349,254],[350,282,349],[268,350,310],[349,310,350],[352,351,282],[353,260,351],[283,353,352],[351,352,353],[305,354,268],[355,283,354],[253,355,305],[354,305,355],[352,354,283],[350,268,354],[282,350,352],[354,352,350],[347,351,260],[356,282,351],[280,356,347],[351,347,356],[357,349,282],[341,254,349],[279,341,357],[349,357,341],[342,358,280],[339,279,358],[257,339,342],[358,342,339],[357,358,279],[356,280,358],[282,356,357],[358,357,356],[359,320,256],[360,272,320],[284,360,359],[320,359,360],[361,318,272],[362,259,318],[285,362,361],[318,361,362],[364,363,284],[365,285,363],[261,365,364],[363,364,365],[361,363,285],[360,284,363],[272,360,361],[363,361,360],[366,66,13],[13,259,366],[366,376,66],[368,367,261],[369,286,367],[287,369,368],[367,368,369],[371,370,286],[264,298,371],[370,298,64],[370,371,298],[373,372,287],[297,264,372],[255,297,373],[372,373,297],[371,372,264],[369,287,372],[286,369,371],[372,371,369],[65,374,370],[374,286,370],[370,64,65],[66,376,65],[375,367,286],[365,261,367],[285,365,375],[367,375,365],[362,285,376],[259,362,366],[376,366,362],[375,376,285],[374,65,376],[286,374,375],[376,375,374],[302,377,253],[378,288,377],[265,378,302],[377,302,378],[380,379,288],[381,262,379],[289,381,380],[379,380,381],[299,382,265],[383,289,382],[258,383,299],[382,299,383],[380,382,289],[378,265,382],[288,378,380],[382,380,378],[385,384,262],[386,290,384],[291,386,385],[384,385,386],[388,387,290],[296,255,387],[263,296,388],[387,388,296],[390,389,291],[295,263,389],[389,390,295],[16,295,69],[295,390,69],[388,389,263],[386,291,389],[290,386,388],[389,388,386],[14,67,391],[68,393,67],[291,392,390],[392,393,68],[390,392,68],[68,69,390],[391,67,393],[383,258,391],[289,383,393],[391,393,383],[385,394,291],[381,289,394],[262,381,385],[394,385,381],[393,394,289],[392,291,394],[394,393,392],[373,387,255],[395,290,387],[287,395,373],[387,373,395],[396,384,290],[397,262,384],[292,397,396],[384,396,397],[368,398,287],[399,292,398],[261,399,368],[398,368,399],[396,398,292],[395,287,398],[290,395,396],[398,396,395],[400,379,262],[401,288,379],[293,401,400],[379,400,401],[402,377,288],[355,253,377],[283,355,402],[377,402,355],[404,73,293],[353,283,403],[73,17,353],[402,403,283],[403,293,73],[353,403,73],[401,293,403],[288,401,402],[403,402,401],[364,405,261],[406,294,405],[284,406,364],[405,364,406],[408,407,294],[75,348,17],[281,348,408],[359,409,284],[407,408,75],[408,348,75],[260,17,348],[345,281,409],[256,345,359],[409,359,345],[408,409,281],[406,284,409],[294,406,408],[409,408,406],[407,74,294],[74,407,75],[260,353,17],[293,410,404],[411,405,294],[73,404,74],[404,410,74],[410,294,74],[399,261,405],[292,399,411],[405,411,399],[400,412,293],[397,292,412],[262,397,400],[412,400,397],[411,412,292],[410,293,412],[294,410,411],[412,411,410],[60,414,42],[413,60,42],[5,60,413],[41,42,414],[42,26,413],[413,26,5],[26,42,4],[58,40,415],[59,58,415],[40,41,415],[416,13,76],[58,13,416],[76,40,416],[416,40,58],[40,76,8],[414,59,41],[60,59,414],[415,41,59],[63,418,45],[417,63,45],[14,63,417],[44,45,418],[45,77,417],[417,77,14],[77,45,9],[61,43,419],[62,61,419],[43,44,419],[420,7,33],[61,7,420],[33,43,420],[420,43,61],[43,33,6],[418,62,44],[63,62,418],[419,44,62],[66,422,48],[421,66,48],[13,66,421],[47,48,422],[48,76,421],[421,76,13],[76,48,8],[64,46,423],[65,64,423],[46,47,423],[424,15,78],[64,15,424],[78,46,424],[424,46,64],[46,78,10],[422,65,47],[66,65,422],[423,47,65],[69,426,51],[425,69,51],[16,69,425],[50,51,426],[51,79,425],[425,79,16],[79,51,11],[67,49,427],[68,67,427],[49,50,427],[428,14,77],[67,14,428],[77,49,428],[428,49,67],[49,77,9],[426,68,50],[69,68,426],[427,50,68],[72,430,54],[429,72,54],[15,72,429],[53,54,430],[54,78,429],[429,78,15],[78,54,10],[70,52,431],[71,70,431],[52,53,431],[432,16,79],[70,16,432],[79,52,432],[432,52,70],[52,79,11],[430,71,53],[72,71,430],[431,53,71],[435,17,80],[75,17,435],[437,434,57],[435,436,434],[436,57,434],[12,57,436],[436,80,12],[435,80,436],[433,438,73],[440,433,55],[439,55,433],[56,55,439],[440,12,80],[55,12,440],[433,440,438],[441,439,433],[440,80,438],[438,80,17],[437,56,441],[57,56,437],[434,437,441],[439,441,56],[17,73,438],[441,433,74],[434,75,435],[434,74,75],[73,74,433],[441,74,434]]);
}
}
